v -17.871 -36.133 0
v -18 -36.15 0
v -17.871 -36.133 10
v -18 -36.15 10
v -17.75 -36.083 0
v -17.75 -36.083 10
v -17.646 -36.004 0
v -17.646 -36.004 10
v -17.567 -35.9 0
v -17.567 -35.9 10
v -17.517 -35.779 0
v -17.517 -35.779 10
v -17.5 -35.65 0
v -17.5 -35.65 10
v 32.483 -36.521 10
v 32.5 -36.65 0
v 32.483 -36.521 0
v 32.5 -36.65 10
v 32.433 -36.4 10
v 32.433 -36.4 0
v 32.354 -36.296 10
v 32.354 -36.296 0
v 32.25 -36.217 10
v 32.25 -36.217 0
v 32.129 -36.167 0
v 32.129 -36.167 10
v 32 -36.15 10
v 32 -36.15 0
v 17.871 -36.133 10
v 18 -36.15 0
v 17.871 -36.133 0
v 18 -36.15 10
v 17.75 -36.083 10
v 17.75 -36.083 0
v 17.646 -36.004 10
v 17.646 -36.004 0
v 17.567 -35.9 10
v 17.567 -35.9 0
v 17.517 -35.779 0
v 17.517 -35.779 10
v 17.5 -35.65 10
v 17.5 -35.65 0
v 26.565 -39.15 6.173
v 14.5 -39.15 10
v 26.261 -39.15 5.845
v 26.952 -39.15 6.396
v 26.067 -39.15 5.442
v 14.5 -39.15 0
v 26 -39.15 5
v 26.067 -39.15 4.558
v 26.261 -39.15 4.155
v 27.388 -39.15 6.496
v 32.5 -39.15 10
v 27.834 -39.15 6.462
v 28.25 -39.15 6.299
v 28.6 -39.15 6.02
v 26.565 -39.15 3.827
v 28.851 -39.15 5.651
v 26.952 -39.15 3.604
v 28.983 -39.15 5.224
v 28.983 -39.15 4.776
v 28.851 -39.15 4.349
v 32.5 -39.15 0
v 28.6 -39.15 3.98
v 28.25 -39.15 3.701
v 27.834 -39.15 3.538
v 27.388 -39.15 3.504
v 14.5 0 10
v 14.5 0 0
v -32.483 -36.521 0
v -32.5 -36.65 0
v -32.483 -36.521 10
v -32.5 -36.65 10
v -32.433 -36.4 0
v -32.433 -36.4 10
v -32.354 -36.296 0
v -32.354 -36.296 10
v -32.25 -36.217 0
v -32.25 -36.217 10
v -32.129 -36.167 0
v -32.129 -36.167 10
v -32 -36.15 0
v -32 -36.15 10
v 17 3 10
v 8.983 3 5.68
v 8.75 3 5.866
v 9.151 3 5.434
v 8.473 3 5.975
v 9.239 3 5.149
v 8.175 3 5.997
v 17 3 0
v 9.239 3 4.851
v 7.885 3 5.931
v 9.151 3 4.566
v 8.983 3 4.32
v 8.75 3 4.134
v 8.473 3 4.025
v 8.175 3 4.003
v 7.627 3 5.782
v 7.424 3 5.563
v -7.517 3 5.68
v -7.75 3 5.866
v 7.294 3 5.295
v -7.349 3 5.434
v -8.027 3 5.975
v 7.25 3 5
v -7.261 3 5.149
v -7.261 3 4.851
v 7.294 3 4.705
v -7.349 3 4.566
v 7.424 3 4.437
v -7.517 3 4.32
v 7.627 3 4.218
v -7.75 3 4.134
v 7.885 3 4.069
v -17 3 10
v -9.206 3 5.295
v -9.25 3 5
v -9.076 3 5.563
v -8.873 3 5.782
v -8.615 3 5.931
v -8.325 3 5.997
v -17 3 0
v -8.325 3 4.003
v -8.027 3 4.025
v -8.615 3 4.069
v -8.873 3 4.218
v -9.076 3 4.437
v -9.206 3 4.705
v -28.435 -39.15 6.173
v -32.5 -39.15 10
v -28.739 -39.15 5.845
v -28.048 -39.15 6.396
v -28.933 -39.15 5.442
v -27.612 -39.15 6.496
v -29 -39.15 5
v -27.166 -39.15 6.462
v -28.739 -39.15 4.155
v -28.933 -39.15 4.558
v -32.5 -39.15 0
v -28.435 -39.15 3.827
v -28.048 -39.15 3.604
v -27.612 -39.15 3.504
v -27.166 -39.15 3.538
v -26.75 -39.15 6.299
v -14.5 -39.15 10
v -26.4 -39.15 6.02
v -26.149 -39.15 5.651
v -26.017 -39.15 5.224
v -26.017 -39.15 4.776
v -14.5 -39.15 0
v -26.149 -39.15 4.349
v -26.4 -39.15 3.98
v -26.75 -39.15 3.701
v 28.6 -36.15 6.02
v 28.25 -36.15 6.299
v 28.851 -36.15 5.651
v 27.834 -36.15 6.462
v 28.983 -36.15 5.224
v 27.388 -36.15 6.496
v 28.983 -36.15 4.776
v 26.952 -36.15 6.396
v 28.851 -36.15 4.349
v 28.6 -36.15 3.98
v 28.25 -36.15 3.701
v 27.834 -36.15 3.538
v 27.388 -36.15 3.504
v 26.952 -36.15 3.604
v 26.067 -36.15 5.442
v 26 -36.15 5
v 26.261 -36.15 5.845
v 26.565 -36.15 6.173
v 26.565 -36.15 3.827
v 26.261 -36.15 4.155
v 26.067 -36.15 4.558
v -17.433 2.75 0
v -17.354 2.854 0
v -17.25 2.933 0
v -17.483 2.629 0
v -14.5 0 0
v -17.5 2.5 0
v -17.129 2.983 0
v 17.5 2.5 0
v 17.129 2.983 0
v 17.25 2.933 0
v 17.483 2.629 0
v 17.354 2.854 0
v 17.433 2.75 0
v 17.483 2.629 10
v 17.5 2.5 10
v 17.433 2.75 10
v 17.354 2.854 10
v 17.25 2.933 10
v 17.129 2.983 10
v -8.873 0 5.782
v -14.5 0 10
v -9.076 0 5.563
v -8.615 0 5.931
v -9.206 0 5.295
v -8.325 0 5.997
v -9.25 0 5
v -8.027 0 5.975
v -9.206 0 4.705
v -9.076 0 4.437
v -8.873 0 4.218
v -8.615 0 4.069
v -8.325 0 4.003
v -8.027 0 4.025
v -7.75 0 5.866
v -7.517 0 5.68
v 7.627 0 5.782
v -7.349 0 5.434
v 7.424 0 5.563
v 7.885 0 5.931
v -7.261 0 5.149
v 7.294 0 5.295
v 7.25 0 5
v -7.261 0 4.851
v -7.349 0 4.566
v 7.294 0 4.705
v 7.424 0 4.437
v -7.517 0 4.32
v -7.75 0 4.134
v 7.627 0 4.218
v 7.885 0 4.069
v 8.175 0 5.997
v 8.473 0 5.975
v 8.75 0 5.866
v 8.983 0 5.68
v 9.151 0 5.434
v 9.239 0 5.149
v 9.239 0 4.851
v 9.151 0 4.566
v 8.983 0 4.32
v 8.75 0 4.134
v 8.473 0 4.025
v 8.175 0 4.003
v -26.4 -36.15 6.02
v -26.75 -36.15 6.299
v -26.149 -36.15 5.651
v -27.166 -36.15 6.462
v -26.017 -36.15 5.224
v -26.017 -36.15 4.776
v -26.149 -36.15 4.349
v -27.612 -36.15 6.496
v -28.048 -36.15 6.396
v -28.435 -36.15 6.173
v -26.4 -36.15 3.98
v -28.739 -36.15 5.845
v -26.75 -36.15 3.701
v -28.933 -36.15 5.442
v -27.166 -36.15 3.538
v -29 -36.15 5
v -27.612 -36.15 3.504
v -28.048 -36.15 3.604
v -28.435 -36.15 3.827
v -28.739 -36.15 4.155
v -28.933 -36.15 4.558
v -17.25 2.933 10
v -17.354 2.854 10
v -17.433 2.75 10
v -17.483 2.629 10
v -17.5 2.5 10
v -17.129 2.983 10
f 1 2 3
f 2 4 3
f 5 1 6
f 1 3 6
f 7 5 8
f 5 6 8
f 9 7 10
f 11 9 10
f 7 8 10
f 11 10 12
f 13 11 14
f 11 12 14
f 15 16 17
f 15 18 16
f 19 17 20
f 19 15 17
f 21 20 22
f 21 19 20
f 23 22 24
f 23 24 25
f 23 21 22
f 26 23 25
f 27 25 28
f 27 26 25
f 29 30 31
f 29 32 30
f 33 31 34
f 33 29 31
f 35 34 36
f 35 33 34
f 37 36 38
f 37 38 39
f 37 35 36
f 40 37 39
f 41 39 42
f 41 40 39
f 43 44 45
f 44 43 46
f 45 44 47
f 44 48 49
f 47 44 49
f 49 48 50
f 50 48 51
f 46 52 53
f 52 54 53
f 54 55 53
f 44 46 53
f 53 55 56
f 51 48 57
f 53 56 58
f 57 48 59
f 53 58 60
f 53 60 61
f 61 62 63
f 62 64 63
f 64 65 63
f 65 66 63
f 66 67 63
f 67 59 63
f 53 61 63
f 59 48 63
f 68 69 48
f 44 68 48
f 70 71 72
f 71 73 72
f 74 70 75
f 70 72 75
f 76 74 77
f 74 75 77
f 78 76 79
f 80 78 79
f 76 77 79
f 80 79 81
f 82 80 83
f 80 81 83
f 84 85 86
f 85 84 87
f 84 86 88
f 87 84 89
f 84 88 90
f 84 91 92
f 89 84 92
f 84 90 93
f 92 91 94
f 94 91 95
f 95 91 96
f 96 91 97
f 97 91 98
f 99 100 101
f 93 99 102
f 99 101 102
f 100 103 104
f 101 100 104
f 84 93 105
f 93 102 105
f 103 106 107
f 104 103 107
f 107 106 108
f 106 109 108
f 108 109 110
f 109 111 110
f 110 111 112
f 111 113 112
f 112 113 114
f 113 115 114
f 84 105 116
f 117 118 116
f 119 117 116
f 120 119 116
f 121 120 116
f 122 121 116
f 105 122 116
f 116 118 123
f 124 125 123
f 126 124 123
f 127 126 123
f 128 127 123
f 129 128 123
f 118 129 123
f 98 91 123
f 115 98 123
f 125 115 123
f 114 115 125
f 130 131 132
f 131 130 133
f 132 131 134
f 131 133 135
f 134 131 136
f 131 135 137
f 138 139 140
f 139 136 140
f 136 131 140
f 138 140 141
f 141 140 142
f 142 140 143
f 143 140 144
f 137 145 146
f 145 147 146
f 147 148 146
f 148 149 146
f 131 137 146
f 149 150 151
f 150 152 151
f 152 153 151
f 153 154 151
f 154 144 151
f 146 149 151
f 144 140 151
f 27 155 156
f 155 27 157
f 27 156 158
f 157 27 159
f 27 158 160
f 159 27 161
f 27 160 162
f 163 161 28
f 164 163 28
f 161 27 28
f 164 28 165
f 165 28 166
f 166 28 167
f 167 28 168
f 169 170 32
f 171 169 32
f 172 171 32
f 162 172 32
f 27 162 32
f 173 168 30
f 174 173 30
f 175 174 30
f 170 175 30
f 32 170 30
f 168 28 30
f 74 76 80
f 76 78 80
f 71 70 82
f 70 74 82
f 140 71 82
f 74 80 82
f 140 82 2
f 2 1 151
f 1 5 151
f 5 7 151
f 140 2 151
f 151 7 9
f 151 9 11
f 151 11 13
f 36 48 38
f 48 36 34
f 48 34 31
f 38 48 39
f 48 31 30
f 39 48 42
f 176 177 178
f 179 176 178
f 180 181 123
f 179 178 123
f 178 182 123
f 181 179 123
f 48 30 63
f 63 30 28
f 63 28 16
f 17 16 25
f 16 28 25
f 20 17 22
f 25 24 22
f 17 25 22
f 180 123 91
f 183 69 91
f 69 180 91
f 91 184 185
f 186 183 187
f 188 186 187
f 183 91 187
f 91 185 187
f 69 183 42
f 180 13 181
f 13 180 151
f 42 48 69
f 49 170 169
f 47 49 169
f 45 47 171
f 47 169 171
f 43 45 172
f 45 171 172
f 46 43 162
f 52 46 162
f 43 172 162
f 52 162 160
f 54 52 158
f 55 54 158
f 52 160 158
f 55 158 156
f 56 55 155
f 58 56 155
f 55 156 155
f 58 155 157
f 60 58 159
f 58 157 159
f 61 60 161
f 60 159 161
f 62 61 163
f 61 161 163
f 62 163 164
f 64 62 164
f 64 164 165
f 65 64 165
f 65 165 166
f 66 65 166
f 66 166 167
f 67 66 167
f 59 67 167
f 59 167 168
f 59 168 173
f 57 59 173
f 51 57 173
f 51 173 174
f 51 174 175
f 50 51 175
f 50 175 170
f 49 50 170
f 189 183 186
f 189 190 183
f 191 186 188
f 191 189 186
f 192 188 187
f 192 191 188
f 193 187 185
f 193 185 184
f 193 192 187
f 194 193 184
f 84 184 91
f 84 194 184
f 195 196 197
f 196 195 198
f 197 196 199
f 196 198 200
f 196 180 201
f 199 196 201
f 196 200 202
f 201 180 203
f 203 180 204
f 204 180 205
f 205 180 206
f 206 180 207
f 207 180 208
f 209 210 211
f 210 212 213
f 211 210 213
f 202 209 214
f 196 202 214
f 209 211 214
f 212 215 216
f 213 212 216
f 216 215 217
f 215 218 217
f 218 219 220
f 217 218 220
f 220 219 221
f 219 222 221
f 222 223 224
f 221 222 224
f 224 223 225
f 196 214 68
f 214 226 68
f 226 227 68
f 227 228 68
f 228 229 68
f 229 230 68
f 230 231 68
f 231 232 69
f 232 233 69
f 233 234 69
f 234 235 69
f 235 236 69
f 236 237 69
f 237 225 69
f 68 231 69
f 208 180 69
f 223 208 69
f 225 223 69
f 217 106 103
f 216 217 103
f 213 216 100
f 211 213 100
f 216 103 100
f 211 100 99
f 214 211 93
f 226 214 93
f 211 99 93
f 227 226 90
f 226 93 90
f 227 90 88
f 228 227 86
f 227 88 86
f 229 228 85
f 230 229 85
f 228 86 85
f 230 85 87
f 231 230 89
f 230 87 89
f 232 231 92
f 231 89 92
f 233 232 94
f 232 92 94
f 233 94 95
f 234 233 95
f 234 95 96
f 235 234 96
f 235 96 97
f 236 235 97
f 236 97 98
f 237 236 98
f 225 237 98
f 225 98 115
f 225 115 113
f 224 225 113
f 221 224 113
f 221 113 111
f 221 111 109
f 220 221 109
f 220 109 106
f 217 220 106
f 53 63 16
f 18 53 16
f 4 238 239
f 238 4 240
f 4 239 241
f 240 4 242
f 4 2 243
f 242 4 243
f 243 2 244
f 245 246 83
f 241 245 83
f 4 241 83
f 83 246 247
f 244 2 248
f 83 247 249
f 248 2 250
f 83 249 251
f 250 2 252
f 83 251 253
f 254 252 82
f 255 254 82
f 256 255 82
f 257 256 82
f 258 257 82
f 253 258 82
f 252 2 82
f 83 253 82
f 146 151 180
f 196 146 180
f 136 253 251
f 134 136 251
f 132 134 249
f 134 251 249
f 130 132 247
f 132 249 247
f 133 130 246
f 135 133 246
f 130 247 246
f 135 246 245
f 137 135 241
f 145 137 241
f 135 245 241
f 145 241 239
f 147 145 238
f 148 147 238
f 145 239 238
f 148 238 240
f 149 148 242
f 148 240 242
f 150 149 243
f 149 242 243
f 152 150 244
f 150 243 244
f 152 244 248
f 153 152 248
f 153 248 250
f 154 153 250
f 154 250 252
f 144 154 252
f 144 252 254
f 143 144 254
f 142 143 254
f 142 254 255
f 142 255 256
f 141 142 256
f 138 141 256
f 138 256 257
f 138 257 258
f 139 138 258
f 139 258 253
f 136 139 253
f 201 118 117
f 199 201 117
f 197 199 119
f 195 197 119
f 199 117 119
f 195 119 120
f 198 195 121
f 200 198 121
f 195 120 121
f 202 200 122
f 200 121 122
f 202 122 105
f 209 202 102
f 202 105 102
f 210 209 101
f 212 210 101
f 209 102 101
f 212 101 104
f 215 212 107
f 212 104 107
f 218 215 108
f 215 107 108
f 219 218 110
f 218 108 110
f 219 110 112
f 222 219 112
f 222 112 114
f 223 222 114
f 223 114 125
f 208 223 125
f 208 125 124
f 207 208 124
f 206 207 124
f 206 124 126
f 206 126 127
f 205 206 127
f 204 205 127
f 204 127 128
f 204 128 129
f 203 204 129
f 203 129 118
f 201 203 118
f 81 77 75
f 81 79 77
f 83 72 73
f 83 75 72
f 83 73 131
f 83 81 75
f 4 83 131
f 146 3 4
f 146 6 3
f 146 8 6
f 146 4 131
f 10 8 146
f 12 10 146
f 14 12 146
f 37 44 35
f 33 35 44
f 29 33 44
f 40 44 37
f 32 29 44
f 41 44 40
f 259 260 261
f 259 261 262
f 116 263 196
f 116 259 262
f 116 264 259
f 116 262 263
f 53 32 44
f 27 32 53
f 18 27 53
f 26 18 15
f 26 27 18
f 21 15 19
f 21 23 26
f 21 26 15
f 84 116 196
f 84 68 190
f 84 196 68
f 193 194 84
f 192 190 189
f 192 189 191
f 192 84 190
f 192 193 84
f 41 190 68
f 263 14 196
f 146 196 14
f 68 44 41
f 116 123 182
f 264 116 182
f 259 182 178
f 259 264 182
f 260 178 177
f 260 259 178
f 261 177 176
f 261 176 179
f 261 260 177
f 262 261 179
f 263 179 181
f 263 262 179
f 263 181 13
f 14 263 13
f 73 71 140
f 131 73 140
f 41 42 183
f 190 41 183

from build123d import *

# Parameters (mm, degrees)
BOSS_EXTRU_3_DEPTH      = 10
ENL_V_MAT_EXTRU_1_REACH = 56.156
ESQUISSE7_R             = 1
ENL_V_MAT_EXTRU_2_REACH = 53.855
ESQUISSE8_R             = 1.5
CONG_8_R                = 0.5


with BuildPart() as part:
    # Esquisse6 → Boss.-Extru.3 (new body)
    with BuildSketch(Plane.XY):
        Polygon((-32.5, -39.15), (-14.5, -39.15), (-14.5, 0), (14.5, 0), (14.5, -39.15), (32.5, -39.15), (32.5, -36.15), (17.5, -36.15), (17.5, 3), (-17.5, 3), (-17.5, -36.15), (-32.5, -36.15), align=None)
    extrude(amount=BOSS_EXTRU_3_DEPTH)

    # Esquisse7 → Enlèv. mat.-Extru.1 (cut, up to next)
    with BuildSketch(Plane(origin=(0, 3, 0), x_dir=(1, 0, 0), z_dir=(0, 1, 0)), mode=Mode.PRIVATE) as enl_v_mat_extru_1_sk1:
        with Locations(Location((-8.25, -5, 0), (0, 0, 180))):
            Circle(ESQUISSE7_R)
    enl_v_mat_extru_1_tool1 = extrude(enl_v_mat_extru_1_sk1.sketch, amount=-ENL_V_MAT_EXTRU_1_REACH, mode=Mode.PRIVATE) & part.part
    # Esquisse7 → Enlèv. mat.-Extru.1 (cut, up to next)
    with BuildSketch(Plane(origin=(0, 3, 0), x_dir=(1, 0, 0), z_dir=(0, 1, 0)), mode=Mode.PRIVATE) as enl_v_mat_extru_1_sk2:
        with Locations(Location((8.25, -5, 0), (0, 0, 180))):
            Circle(ESQUISSE7_R)
    enl_v_mat_extru_1_tool2 = extrude(enl_v_mat_extru_1_sk2.sketch, amount=-ENL_V_MAT_EXTRU_1_REACH, mode=Mode.PRIVATE) & part.part
    add(enl_v_mat_extru_1_tool1.solids().sort_by_distance((-8.25, 3, 5))[0], mode=Mode.SUBTRACT)
    add(enl_v_mat_extru_1_tool2.solids().sort_by_distance((8.25, 3, 5))[0], mode=Mode.SUBTRACT)

    # Esquisse8 → Enlèv. mat.-Extru.2 (cut, up to next)
    with BuildSketch(Plane(origin=(0, -36.15, 0), x_dir=(1, 0, 0), z_dir=(0, 1, 0)), mode=Mode.PRIVATE) as enl_v_mat_extru_2_sk1:
        with Locations(Location((27.5, -5, 0), (0, 0, 180))):
            Circle(ESQUISSE8_R)
    enl_v_mat_extru_2_tool1 = extrude(enl_v_mat_extru_2_sk1.sketch, amount=-ENL_V_MAT_EXTRU_2_REACH, mode=Mode.PRIVATE) & part.part
    # Esquisse8 → Enlèv. mat.-Extru.2 (cut, up to next)
    with BuildSketch(Plane(origin=(0, -36.15, 0), x_dir=(1, 0, 0), z_dir=(0, 1, 0)), mode=Mode.PRIVATE) as enl_v_mat_extru_2_sk2:
        with Locations(Location((-27.5, -5, 0), (0, 0, 180))):
            Circle(ESQUISSE8_R)
    enl_v_mat_extru_2_tool2 = extrude(enl_v_mat_extru_2_sk2.sketch, amount=-ENL_V_MAT_EXTRU_2_REACH, mode=Mode.PRIVATE) & part.part
    add(enl_v_mat_extru_2_tool1.solids().sort_by_distance((27.5, -36.15, 5))[0], mode=Mode.SUBTRACT)
    add(enl_v_mat_extru_2_tool2.solids().sort_by_distance((-27.5, -36.15, 5))[0], mode=Mode.SUBTRACT)

    # Congé8
    cong_8_edges = [part.edges().sort_by_distance(p)[0] for p in [
        (-32.5, -36.15, 5),
        (-17.5, -36.15, 5),
        (-17.5, 3, 5),
        (17.5, 3, 5),
        (17.5, -36.15, 5),
        (32.5, -36.15, 5),
    ]]
    fillet(cong_8_edges, radius=CONG_8_R)


solid = part.part
